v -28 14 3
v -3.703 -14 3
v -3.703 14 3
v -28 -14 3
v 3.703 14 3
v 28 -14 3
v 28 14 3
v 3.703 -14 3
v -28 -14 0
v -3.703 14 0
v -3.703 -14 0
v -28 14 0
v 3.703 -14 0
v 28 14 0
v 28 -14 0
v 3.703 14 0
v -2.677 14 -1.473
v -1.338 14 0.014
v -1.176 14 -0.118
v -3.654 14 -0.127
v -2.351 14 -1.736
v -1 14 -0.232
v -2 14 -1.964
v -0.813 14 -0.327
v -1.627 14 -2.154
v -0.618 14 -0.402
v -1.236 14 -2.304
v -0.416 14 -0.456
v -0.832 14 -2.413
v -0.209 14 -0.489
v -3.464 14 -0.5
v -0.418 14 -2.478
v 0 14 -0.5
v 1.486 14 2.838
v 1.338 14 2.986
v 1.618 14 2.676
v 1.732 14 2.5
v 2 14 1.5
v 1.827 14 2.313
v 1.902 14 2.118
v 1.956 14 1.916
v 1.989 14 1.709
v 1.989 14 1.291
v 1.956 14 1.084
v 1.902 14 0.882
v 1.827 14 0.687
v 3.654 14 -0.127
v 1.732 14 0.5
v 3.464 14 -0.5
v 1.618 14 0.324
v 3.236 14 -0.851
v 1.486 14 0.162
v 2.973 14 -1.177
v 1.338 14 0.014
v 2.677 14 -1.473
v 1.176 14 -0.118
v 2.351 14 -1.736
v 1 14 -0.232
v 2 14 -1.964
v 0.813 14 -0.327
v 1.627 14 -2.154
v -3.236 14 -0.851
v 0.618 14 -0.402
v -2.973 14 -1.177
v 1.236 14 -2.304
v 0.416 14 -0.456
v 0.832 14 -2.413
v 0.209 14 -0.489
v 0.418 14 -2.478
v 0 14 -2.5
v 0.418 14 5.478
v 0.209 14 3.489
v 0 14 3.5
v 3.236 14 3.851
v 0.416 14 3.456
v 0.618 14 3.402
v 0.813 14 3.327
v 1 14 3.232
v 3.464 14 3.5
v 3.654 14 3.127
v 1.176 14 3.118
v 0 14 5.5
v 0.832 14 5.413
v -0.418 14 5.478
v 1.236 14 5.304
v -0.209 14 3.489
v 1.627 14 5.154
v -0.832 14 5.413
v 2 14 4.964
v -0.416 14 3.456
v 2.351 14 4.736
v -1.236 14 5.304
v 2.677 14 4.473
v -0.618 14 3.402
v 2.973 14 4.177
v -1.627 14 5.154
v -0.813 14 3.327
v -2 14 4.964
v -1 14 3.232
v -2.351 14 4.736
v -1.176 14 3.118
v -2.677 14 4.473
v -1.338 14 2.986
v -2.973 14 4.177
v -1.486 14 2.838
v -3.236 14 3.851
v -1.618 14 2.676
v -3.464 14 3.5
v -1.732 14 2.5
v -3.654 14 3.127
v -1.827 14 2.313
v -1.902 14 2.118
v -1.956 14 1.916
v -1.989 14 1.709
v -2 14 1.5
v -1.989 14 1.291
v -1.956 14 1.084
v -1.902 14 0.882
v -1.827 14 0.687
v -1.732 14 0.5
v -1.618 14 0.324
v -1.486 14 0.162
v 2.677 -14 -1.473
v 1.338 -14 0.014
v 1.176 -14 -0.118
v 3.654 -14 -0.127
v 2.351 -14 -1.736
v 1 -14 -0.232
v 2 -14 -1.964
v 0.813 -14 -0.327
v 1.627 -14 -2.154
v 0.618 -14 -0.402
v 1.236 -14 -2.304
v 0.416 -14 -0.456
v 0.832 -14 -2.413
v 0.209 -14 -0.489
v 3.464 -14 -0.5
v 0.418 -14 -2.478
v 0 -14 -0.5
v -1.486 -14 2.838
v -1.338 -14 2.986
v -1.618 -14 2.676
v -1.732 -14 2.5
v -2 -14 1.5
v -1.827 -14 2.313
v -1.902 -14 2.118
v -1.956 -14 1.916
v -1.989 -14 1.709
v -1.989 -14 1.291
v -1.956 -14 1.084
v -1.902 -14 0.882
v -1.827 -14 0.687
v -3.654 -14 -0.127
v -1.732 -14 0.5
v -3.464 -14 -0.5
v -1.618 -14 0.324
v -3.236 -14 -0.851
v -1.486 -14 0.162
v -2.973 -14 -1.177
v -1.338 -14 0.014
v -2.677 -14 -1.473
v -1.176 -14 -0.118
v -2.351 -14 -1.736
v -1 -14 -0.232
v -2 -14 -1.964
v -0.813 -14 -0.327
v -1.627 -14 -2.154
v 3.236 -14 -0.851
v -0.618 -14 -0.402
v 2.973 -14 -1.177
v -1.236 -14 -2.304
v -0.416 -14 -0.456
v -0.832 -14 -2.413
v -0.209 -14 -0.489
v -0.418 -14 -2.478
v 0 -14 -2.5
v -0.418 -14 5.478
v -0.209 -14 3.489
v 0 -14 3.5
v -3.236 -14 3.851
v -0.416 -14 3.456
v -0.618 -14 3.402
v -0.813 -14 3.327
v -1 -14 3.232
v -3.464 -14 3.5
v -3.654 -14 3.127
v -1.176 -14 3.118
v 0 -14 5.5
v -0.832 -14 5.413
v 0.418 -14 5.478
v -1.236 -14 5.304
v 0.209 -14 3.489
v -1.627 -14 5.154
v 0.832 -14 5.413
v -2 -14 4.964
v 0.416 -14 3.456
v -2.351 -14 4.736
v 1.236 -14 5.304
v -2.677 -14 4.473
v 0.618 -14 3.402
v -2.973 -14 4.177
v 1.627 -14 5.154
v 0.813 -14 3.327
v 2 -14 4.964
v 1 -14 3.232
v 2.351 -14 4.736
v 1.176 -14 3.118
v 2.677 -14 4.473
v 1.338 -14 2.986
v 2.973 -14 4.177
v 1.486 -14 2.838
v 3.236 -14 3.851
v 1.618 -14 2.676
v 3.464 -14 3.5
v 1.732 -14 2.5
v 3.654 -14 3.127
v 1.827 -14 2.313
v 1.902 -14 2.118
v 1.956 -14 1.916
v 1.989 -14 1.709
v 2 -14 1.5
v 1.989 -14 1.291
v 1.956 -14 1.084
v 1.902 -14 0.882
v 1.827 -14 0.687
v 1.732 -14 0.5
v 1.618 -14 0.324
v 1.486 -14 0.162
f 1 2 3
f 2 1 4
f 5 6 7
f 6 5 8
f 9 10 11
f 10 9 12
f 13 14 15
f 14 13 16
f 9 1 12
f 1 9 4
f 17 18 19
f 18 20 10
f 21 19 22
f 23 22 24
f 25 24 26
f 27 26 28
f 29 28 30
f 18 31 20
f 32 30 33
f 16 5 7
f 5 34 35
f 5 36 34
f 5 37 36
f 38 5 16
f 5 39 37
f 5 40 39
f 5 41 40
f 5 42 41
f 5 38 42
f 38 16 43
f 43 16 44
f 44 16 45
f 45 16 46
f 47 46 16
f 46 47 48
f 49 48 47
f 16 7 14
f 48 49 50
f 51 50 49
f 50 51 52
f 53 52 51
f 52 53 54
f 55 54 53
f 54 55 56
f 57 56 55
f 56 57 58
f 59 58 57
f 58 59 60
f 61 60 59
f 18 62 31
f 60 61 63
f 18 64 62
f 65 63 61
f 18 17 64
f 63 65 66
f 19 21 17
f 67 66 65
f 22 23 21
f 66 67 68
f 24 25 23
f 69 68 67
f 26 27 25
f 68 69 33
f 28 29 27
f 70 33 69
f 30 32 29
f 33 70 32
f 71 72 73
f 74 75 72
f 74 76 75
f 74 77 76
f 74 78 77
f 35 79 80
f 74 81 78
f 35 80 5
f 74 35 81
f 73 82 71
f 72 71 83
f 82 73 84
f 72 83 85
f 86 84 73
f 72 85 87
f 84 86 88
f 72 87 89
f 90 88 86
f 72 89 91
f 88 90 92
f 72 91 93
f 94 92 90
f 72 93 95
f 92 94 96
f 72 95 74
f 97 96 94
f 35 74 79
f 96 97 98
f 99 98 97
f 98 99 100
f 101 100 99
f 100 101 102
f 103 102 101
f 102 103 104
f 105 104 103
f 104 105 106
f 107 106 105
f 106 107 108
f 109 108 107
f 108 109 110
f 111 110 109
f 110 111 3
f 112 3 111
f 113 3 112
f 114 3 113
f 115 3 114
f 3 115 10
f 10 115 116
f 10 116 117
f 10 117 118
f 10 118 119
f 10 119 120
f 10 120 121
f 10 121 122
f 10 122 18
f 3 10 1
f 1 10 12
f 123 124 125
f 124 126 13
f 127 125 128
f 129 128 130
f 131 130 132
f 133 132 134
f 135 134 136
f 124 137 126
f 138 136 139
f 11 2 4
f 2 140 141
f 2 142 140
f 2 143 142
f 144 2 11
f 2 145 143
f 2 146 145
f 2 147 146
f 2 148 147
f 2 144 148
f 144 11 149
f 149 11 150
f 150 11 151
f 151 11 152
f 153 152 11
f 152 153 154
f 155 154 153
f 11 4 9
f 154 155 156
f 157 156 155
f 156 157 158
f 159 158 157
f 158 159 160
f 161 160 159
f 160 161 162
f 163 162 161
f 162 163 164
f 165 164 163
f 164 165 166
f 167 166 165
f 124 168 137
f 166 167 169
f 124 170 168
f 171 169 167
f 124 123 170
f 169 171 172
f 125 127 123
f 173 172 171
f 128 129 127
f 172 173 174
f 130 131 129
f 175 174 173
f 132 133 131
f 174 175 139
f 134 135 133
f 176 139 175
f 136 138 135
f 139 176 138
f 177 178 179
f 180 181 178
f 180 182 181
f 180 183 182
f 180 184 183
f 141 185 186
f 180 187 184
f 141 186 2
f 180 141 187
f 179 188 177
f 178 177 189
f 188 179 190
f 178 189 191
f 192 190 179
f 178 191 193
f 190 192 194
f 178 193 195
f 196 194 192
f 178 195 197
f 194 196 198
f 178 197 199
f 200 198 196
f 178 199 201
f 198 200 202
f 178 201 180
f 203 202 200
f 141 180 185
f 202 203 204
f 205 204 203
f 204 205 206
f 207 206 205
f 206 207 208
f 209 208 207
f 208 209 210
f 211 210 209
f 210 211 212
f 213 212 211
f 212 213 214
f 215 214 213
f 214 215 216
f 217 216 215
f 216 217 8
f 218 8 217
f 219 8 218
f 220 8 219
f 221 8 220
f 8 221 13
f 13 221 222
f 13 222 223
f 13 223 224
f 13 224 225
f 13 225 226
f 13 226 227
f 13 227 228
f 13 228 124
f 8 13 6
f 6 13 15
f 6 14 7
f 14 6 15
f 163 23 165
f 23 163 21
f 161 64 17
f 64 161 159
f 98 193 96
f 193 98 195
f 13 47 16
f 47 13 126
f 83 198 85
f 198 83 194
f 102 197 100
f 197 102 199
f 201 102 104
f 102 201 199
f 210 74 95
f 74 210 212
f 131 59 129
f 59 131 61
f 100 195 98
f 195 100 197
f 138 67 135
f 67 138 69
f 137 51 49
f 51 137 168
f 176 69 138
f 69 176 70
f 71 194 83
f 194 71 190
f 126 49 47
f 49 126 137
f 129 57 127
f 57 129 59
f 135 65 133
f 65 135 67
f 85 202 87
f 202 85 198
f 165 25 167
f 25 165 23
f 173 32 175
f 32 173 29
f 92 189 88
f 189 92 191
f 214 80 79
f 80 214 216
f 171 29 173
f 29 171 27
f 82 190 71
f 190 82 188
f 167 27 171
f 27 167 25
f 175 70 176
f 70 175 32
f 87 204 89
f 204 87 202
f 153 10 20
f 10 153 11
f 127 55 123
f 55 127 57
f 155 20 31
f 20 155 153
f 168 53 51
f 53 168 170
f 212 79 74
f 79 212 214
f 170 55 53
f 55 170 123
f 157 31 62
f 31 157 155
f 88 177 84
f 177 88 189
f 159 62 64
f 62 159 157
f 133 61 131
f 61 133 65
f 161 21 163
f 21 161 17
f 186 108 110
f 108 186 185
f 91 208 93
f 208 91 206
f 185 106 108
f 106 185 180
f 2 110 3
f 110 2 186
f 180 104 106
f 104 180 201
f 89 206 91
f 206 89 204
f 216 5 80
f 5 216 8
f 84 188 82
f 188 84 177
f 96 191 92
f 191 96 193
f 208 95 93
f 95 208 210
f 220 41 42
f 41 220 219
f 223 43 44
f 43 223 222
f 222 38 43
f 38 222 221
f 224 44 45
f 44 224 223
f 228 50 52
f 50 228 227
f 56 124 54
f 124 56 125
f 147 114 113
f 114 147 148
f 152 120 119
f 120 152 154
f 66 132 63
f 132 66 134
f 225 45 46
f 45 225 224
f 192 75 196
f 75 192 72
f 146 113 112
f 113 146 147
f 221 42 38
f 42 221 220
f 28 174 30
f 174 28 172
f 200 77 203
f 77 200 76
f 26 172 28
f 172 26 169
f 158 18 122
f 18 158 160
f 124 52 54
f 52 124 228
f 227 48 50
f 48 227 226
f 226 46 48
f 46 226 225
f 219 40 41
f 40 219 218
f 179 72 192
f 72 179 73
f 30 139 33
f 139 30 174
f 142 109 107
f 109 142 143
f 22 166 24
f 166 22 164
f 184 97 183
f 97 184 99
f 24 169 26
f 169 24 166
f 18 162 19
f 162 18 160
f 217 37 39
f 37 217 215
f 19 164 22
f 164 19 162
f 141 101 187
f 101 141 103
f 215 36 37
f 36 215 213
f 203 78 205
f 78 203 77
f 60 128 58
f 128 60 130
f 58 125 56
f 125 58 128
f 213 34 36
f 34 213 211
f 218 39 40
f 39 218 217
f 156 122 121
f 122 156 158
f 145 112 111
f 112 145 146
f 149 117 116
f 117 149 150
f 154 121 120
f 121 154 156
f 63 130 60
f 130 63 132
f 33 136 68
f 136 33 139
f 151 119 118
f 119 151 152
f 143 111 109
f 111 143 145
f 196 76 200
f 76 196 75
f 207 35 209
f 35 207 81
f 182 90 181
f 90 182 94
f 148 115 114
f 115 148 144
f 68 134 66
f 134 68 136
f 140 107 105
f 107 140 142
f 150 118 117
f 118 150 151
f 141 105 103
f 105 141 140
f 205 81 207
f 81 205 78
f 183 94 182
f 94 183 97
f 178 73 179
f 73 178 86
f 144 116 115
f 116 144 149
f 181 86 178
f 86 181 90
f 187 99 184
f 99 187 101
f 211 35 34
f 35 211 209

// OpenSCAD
// Compact plate hinge.
$fn = 60;
eps = 0.02;
leaf_l = 28;
width = 28;
pin_d = 4;
leaf_t = 3;
difference() {
    union() {
        translate([-leaf_l,-width/2,0]) cube([leaf_l,width,leaf_t]);
        translate([0,-width/2,0]) cube([leaf_l,width,leaf_t]);
        translate([0,-width/2,leaf_t/2]) rotate([-90,0,0]) cylinder(d=pin_d+4,h=width);
    }
    translate([0,-width/2-eps,leaf_t/2]) rotate([-90,0,0]) cylinder(d=pin_d,h=width+2*eps);
}
